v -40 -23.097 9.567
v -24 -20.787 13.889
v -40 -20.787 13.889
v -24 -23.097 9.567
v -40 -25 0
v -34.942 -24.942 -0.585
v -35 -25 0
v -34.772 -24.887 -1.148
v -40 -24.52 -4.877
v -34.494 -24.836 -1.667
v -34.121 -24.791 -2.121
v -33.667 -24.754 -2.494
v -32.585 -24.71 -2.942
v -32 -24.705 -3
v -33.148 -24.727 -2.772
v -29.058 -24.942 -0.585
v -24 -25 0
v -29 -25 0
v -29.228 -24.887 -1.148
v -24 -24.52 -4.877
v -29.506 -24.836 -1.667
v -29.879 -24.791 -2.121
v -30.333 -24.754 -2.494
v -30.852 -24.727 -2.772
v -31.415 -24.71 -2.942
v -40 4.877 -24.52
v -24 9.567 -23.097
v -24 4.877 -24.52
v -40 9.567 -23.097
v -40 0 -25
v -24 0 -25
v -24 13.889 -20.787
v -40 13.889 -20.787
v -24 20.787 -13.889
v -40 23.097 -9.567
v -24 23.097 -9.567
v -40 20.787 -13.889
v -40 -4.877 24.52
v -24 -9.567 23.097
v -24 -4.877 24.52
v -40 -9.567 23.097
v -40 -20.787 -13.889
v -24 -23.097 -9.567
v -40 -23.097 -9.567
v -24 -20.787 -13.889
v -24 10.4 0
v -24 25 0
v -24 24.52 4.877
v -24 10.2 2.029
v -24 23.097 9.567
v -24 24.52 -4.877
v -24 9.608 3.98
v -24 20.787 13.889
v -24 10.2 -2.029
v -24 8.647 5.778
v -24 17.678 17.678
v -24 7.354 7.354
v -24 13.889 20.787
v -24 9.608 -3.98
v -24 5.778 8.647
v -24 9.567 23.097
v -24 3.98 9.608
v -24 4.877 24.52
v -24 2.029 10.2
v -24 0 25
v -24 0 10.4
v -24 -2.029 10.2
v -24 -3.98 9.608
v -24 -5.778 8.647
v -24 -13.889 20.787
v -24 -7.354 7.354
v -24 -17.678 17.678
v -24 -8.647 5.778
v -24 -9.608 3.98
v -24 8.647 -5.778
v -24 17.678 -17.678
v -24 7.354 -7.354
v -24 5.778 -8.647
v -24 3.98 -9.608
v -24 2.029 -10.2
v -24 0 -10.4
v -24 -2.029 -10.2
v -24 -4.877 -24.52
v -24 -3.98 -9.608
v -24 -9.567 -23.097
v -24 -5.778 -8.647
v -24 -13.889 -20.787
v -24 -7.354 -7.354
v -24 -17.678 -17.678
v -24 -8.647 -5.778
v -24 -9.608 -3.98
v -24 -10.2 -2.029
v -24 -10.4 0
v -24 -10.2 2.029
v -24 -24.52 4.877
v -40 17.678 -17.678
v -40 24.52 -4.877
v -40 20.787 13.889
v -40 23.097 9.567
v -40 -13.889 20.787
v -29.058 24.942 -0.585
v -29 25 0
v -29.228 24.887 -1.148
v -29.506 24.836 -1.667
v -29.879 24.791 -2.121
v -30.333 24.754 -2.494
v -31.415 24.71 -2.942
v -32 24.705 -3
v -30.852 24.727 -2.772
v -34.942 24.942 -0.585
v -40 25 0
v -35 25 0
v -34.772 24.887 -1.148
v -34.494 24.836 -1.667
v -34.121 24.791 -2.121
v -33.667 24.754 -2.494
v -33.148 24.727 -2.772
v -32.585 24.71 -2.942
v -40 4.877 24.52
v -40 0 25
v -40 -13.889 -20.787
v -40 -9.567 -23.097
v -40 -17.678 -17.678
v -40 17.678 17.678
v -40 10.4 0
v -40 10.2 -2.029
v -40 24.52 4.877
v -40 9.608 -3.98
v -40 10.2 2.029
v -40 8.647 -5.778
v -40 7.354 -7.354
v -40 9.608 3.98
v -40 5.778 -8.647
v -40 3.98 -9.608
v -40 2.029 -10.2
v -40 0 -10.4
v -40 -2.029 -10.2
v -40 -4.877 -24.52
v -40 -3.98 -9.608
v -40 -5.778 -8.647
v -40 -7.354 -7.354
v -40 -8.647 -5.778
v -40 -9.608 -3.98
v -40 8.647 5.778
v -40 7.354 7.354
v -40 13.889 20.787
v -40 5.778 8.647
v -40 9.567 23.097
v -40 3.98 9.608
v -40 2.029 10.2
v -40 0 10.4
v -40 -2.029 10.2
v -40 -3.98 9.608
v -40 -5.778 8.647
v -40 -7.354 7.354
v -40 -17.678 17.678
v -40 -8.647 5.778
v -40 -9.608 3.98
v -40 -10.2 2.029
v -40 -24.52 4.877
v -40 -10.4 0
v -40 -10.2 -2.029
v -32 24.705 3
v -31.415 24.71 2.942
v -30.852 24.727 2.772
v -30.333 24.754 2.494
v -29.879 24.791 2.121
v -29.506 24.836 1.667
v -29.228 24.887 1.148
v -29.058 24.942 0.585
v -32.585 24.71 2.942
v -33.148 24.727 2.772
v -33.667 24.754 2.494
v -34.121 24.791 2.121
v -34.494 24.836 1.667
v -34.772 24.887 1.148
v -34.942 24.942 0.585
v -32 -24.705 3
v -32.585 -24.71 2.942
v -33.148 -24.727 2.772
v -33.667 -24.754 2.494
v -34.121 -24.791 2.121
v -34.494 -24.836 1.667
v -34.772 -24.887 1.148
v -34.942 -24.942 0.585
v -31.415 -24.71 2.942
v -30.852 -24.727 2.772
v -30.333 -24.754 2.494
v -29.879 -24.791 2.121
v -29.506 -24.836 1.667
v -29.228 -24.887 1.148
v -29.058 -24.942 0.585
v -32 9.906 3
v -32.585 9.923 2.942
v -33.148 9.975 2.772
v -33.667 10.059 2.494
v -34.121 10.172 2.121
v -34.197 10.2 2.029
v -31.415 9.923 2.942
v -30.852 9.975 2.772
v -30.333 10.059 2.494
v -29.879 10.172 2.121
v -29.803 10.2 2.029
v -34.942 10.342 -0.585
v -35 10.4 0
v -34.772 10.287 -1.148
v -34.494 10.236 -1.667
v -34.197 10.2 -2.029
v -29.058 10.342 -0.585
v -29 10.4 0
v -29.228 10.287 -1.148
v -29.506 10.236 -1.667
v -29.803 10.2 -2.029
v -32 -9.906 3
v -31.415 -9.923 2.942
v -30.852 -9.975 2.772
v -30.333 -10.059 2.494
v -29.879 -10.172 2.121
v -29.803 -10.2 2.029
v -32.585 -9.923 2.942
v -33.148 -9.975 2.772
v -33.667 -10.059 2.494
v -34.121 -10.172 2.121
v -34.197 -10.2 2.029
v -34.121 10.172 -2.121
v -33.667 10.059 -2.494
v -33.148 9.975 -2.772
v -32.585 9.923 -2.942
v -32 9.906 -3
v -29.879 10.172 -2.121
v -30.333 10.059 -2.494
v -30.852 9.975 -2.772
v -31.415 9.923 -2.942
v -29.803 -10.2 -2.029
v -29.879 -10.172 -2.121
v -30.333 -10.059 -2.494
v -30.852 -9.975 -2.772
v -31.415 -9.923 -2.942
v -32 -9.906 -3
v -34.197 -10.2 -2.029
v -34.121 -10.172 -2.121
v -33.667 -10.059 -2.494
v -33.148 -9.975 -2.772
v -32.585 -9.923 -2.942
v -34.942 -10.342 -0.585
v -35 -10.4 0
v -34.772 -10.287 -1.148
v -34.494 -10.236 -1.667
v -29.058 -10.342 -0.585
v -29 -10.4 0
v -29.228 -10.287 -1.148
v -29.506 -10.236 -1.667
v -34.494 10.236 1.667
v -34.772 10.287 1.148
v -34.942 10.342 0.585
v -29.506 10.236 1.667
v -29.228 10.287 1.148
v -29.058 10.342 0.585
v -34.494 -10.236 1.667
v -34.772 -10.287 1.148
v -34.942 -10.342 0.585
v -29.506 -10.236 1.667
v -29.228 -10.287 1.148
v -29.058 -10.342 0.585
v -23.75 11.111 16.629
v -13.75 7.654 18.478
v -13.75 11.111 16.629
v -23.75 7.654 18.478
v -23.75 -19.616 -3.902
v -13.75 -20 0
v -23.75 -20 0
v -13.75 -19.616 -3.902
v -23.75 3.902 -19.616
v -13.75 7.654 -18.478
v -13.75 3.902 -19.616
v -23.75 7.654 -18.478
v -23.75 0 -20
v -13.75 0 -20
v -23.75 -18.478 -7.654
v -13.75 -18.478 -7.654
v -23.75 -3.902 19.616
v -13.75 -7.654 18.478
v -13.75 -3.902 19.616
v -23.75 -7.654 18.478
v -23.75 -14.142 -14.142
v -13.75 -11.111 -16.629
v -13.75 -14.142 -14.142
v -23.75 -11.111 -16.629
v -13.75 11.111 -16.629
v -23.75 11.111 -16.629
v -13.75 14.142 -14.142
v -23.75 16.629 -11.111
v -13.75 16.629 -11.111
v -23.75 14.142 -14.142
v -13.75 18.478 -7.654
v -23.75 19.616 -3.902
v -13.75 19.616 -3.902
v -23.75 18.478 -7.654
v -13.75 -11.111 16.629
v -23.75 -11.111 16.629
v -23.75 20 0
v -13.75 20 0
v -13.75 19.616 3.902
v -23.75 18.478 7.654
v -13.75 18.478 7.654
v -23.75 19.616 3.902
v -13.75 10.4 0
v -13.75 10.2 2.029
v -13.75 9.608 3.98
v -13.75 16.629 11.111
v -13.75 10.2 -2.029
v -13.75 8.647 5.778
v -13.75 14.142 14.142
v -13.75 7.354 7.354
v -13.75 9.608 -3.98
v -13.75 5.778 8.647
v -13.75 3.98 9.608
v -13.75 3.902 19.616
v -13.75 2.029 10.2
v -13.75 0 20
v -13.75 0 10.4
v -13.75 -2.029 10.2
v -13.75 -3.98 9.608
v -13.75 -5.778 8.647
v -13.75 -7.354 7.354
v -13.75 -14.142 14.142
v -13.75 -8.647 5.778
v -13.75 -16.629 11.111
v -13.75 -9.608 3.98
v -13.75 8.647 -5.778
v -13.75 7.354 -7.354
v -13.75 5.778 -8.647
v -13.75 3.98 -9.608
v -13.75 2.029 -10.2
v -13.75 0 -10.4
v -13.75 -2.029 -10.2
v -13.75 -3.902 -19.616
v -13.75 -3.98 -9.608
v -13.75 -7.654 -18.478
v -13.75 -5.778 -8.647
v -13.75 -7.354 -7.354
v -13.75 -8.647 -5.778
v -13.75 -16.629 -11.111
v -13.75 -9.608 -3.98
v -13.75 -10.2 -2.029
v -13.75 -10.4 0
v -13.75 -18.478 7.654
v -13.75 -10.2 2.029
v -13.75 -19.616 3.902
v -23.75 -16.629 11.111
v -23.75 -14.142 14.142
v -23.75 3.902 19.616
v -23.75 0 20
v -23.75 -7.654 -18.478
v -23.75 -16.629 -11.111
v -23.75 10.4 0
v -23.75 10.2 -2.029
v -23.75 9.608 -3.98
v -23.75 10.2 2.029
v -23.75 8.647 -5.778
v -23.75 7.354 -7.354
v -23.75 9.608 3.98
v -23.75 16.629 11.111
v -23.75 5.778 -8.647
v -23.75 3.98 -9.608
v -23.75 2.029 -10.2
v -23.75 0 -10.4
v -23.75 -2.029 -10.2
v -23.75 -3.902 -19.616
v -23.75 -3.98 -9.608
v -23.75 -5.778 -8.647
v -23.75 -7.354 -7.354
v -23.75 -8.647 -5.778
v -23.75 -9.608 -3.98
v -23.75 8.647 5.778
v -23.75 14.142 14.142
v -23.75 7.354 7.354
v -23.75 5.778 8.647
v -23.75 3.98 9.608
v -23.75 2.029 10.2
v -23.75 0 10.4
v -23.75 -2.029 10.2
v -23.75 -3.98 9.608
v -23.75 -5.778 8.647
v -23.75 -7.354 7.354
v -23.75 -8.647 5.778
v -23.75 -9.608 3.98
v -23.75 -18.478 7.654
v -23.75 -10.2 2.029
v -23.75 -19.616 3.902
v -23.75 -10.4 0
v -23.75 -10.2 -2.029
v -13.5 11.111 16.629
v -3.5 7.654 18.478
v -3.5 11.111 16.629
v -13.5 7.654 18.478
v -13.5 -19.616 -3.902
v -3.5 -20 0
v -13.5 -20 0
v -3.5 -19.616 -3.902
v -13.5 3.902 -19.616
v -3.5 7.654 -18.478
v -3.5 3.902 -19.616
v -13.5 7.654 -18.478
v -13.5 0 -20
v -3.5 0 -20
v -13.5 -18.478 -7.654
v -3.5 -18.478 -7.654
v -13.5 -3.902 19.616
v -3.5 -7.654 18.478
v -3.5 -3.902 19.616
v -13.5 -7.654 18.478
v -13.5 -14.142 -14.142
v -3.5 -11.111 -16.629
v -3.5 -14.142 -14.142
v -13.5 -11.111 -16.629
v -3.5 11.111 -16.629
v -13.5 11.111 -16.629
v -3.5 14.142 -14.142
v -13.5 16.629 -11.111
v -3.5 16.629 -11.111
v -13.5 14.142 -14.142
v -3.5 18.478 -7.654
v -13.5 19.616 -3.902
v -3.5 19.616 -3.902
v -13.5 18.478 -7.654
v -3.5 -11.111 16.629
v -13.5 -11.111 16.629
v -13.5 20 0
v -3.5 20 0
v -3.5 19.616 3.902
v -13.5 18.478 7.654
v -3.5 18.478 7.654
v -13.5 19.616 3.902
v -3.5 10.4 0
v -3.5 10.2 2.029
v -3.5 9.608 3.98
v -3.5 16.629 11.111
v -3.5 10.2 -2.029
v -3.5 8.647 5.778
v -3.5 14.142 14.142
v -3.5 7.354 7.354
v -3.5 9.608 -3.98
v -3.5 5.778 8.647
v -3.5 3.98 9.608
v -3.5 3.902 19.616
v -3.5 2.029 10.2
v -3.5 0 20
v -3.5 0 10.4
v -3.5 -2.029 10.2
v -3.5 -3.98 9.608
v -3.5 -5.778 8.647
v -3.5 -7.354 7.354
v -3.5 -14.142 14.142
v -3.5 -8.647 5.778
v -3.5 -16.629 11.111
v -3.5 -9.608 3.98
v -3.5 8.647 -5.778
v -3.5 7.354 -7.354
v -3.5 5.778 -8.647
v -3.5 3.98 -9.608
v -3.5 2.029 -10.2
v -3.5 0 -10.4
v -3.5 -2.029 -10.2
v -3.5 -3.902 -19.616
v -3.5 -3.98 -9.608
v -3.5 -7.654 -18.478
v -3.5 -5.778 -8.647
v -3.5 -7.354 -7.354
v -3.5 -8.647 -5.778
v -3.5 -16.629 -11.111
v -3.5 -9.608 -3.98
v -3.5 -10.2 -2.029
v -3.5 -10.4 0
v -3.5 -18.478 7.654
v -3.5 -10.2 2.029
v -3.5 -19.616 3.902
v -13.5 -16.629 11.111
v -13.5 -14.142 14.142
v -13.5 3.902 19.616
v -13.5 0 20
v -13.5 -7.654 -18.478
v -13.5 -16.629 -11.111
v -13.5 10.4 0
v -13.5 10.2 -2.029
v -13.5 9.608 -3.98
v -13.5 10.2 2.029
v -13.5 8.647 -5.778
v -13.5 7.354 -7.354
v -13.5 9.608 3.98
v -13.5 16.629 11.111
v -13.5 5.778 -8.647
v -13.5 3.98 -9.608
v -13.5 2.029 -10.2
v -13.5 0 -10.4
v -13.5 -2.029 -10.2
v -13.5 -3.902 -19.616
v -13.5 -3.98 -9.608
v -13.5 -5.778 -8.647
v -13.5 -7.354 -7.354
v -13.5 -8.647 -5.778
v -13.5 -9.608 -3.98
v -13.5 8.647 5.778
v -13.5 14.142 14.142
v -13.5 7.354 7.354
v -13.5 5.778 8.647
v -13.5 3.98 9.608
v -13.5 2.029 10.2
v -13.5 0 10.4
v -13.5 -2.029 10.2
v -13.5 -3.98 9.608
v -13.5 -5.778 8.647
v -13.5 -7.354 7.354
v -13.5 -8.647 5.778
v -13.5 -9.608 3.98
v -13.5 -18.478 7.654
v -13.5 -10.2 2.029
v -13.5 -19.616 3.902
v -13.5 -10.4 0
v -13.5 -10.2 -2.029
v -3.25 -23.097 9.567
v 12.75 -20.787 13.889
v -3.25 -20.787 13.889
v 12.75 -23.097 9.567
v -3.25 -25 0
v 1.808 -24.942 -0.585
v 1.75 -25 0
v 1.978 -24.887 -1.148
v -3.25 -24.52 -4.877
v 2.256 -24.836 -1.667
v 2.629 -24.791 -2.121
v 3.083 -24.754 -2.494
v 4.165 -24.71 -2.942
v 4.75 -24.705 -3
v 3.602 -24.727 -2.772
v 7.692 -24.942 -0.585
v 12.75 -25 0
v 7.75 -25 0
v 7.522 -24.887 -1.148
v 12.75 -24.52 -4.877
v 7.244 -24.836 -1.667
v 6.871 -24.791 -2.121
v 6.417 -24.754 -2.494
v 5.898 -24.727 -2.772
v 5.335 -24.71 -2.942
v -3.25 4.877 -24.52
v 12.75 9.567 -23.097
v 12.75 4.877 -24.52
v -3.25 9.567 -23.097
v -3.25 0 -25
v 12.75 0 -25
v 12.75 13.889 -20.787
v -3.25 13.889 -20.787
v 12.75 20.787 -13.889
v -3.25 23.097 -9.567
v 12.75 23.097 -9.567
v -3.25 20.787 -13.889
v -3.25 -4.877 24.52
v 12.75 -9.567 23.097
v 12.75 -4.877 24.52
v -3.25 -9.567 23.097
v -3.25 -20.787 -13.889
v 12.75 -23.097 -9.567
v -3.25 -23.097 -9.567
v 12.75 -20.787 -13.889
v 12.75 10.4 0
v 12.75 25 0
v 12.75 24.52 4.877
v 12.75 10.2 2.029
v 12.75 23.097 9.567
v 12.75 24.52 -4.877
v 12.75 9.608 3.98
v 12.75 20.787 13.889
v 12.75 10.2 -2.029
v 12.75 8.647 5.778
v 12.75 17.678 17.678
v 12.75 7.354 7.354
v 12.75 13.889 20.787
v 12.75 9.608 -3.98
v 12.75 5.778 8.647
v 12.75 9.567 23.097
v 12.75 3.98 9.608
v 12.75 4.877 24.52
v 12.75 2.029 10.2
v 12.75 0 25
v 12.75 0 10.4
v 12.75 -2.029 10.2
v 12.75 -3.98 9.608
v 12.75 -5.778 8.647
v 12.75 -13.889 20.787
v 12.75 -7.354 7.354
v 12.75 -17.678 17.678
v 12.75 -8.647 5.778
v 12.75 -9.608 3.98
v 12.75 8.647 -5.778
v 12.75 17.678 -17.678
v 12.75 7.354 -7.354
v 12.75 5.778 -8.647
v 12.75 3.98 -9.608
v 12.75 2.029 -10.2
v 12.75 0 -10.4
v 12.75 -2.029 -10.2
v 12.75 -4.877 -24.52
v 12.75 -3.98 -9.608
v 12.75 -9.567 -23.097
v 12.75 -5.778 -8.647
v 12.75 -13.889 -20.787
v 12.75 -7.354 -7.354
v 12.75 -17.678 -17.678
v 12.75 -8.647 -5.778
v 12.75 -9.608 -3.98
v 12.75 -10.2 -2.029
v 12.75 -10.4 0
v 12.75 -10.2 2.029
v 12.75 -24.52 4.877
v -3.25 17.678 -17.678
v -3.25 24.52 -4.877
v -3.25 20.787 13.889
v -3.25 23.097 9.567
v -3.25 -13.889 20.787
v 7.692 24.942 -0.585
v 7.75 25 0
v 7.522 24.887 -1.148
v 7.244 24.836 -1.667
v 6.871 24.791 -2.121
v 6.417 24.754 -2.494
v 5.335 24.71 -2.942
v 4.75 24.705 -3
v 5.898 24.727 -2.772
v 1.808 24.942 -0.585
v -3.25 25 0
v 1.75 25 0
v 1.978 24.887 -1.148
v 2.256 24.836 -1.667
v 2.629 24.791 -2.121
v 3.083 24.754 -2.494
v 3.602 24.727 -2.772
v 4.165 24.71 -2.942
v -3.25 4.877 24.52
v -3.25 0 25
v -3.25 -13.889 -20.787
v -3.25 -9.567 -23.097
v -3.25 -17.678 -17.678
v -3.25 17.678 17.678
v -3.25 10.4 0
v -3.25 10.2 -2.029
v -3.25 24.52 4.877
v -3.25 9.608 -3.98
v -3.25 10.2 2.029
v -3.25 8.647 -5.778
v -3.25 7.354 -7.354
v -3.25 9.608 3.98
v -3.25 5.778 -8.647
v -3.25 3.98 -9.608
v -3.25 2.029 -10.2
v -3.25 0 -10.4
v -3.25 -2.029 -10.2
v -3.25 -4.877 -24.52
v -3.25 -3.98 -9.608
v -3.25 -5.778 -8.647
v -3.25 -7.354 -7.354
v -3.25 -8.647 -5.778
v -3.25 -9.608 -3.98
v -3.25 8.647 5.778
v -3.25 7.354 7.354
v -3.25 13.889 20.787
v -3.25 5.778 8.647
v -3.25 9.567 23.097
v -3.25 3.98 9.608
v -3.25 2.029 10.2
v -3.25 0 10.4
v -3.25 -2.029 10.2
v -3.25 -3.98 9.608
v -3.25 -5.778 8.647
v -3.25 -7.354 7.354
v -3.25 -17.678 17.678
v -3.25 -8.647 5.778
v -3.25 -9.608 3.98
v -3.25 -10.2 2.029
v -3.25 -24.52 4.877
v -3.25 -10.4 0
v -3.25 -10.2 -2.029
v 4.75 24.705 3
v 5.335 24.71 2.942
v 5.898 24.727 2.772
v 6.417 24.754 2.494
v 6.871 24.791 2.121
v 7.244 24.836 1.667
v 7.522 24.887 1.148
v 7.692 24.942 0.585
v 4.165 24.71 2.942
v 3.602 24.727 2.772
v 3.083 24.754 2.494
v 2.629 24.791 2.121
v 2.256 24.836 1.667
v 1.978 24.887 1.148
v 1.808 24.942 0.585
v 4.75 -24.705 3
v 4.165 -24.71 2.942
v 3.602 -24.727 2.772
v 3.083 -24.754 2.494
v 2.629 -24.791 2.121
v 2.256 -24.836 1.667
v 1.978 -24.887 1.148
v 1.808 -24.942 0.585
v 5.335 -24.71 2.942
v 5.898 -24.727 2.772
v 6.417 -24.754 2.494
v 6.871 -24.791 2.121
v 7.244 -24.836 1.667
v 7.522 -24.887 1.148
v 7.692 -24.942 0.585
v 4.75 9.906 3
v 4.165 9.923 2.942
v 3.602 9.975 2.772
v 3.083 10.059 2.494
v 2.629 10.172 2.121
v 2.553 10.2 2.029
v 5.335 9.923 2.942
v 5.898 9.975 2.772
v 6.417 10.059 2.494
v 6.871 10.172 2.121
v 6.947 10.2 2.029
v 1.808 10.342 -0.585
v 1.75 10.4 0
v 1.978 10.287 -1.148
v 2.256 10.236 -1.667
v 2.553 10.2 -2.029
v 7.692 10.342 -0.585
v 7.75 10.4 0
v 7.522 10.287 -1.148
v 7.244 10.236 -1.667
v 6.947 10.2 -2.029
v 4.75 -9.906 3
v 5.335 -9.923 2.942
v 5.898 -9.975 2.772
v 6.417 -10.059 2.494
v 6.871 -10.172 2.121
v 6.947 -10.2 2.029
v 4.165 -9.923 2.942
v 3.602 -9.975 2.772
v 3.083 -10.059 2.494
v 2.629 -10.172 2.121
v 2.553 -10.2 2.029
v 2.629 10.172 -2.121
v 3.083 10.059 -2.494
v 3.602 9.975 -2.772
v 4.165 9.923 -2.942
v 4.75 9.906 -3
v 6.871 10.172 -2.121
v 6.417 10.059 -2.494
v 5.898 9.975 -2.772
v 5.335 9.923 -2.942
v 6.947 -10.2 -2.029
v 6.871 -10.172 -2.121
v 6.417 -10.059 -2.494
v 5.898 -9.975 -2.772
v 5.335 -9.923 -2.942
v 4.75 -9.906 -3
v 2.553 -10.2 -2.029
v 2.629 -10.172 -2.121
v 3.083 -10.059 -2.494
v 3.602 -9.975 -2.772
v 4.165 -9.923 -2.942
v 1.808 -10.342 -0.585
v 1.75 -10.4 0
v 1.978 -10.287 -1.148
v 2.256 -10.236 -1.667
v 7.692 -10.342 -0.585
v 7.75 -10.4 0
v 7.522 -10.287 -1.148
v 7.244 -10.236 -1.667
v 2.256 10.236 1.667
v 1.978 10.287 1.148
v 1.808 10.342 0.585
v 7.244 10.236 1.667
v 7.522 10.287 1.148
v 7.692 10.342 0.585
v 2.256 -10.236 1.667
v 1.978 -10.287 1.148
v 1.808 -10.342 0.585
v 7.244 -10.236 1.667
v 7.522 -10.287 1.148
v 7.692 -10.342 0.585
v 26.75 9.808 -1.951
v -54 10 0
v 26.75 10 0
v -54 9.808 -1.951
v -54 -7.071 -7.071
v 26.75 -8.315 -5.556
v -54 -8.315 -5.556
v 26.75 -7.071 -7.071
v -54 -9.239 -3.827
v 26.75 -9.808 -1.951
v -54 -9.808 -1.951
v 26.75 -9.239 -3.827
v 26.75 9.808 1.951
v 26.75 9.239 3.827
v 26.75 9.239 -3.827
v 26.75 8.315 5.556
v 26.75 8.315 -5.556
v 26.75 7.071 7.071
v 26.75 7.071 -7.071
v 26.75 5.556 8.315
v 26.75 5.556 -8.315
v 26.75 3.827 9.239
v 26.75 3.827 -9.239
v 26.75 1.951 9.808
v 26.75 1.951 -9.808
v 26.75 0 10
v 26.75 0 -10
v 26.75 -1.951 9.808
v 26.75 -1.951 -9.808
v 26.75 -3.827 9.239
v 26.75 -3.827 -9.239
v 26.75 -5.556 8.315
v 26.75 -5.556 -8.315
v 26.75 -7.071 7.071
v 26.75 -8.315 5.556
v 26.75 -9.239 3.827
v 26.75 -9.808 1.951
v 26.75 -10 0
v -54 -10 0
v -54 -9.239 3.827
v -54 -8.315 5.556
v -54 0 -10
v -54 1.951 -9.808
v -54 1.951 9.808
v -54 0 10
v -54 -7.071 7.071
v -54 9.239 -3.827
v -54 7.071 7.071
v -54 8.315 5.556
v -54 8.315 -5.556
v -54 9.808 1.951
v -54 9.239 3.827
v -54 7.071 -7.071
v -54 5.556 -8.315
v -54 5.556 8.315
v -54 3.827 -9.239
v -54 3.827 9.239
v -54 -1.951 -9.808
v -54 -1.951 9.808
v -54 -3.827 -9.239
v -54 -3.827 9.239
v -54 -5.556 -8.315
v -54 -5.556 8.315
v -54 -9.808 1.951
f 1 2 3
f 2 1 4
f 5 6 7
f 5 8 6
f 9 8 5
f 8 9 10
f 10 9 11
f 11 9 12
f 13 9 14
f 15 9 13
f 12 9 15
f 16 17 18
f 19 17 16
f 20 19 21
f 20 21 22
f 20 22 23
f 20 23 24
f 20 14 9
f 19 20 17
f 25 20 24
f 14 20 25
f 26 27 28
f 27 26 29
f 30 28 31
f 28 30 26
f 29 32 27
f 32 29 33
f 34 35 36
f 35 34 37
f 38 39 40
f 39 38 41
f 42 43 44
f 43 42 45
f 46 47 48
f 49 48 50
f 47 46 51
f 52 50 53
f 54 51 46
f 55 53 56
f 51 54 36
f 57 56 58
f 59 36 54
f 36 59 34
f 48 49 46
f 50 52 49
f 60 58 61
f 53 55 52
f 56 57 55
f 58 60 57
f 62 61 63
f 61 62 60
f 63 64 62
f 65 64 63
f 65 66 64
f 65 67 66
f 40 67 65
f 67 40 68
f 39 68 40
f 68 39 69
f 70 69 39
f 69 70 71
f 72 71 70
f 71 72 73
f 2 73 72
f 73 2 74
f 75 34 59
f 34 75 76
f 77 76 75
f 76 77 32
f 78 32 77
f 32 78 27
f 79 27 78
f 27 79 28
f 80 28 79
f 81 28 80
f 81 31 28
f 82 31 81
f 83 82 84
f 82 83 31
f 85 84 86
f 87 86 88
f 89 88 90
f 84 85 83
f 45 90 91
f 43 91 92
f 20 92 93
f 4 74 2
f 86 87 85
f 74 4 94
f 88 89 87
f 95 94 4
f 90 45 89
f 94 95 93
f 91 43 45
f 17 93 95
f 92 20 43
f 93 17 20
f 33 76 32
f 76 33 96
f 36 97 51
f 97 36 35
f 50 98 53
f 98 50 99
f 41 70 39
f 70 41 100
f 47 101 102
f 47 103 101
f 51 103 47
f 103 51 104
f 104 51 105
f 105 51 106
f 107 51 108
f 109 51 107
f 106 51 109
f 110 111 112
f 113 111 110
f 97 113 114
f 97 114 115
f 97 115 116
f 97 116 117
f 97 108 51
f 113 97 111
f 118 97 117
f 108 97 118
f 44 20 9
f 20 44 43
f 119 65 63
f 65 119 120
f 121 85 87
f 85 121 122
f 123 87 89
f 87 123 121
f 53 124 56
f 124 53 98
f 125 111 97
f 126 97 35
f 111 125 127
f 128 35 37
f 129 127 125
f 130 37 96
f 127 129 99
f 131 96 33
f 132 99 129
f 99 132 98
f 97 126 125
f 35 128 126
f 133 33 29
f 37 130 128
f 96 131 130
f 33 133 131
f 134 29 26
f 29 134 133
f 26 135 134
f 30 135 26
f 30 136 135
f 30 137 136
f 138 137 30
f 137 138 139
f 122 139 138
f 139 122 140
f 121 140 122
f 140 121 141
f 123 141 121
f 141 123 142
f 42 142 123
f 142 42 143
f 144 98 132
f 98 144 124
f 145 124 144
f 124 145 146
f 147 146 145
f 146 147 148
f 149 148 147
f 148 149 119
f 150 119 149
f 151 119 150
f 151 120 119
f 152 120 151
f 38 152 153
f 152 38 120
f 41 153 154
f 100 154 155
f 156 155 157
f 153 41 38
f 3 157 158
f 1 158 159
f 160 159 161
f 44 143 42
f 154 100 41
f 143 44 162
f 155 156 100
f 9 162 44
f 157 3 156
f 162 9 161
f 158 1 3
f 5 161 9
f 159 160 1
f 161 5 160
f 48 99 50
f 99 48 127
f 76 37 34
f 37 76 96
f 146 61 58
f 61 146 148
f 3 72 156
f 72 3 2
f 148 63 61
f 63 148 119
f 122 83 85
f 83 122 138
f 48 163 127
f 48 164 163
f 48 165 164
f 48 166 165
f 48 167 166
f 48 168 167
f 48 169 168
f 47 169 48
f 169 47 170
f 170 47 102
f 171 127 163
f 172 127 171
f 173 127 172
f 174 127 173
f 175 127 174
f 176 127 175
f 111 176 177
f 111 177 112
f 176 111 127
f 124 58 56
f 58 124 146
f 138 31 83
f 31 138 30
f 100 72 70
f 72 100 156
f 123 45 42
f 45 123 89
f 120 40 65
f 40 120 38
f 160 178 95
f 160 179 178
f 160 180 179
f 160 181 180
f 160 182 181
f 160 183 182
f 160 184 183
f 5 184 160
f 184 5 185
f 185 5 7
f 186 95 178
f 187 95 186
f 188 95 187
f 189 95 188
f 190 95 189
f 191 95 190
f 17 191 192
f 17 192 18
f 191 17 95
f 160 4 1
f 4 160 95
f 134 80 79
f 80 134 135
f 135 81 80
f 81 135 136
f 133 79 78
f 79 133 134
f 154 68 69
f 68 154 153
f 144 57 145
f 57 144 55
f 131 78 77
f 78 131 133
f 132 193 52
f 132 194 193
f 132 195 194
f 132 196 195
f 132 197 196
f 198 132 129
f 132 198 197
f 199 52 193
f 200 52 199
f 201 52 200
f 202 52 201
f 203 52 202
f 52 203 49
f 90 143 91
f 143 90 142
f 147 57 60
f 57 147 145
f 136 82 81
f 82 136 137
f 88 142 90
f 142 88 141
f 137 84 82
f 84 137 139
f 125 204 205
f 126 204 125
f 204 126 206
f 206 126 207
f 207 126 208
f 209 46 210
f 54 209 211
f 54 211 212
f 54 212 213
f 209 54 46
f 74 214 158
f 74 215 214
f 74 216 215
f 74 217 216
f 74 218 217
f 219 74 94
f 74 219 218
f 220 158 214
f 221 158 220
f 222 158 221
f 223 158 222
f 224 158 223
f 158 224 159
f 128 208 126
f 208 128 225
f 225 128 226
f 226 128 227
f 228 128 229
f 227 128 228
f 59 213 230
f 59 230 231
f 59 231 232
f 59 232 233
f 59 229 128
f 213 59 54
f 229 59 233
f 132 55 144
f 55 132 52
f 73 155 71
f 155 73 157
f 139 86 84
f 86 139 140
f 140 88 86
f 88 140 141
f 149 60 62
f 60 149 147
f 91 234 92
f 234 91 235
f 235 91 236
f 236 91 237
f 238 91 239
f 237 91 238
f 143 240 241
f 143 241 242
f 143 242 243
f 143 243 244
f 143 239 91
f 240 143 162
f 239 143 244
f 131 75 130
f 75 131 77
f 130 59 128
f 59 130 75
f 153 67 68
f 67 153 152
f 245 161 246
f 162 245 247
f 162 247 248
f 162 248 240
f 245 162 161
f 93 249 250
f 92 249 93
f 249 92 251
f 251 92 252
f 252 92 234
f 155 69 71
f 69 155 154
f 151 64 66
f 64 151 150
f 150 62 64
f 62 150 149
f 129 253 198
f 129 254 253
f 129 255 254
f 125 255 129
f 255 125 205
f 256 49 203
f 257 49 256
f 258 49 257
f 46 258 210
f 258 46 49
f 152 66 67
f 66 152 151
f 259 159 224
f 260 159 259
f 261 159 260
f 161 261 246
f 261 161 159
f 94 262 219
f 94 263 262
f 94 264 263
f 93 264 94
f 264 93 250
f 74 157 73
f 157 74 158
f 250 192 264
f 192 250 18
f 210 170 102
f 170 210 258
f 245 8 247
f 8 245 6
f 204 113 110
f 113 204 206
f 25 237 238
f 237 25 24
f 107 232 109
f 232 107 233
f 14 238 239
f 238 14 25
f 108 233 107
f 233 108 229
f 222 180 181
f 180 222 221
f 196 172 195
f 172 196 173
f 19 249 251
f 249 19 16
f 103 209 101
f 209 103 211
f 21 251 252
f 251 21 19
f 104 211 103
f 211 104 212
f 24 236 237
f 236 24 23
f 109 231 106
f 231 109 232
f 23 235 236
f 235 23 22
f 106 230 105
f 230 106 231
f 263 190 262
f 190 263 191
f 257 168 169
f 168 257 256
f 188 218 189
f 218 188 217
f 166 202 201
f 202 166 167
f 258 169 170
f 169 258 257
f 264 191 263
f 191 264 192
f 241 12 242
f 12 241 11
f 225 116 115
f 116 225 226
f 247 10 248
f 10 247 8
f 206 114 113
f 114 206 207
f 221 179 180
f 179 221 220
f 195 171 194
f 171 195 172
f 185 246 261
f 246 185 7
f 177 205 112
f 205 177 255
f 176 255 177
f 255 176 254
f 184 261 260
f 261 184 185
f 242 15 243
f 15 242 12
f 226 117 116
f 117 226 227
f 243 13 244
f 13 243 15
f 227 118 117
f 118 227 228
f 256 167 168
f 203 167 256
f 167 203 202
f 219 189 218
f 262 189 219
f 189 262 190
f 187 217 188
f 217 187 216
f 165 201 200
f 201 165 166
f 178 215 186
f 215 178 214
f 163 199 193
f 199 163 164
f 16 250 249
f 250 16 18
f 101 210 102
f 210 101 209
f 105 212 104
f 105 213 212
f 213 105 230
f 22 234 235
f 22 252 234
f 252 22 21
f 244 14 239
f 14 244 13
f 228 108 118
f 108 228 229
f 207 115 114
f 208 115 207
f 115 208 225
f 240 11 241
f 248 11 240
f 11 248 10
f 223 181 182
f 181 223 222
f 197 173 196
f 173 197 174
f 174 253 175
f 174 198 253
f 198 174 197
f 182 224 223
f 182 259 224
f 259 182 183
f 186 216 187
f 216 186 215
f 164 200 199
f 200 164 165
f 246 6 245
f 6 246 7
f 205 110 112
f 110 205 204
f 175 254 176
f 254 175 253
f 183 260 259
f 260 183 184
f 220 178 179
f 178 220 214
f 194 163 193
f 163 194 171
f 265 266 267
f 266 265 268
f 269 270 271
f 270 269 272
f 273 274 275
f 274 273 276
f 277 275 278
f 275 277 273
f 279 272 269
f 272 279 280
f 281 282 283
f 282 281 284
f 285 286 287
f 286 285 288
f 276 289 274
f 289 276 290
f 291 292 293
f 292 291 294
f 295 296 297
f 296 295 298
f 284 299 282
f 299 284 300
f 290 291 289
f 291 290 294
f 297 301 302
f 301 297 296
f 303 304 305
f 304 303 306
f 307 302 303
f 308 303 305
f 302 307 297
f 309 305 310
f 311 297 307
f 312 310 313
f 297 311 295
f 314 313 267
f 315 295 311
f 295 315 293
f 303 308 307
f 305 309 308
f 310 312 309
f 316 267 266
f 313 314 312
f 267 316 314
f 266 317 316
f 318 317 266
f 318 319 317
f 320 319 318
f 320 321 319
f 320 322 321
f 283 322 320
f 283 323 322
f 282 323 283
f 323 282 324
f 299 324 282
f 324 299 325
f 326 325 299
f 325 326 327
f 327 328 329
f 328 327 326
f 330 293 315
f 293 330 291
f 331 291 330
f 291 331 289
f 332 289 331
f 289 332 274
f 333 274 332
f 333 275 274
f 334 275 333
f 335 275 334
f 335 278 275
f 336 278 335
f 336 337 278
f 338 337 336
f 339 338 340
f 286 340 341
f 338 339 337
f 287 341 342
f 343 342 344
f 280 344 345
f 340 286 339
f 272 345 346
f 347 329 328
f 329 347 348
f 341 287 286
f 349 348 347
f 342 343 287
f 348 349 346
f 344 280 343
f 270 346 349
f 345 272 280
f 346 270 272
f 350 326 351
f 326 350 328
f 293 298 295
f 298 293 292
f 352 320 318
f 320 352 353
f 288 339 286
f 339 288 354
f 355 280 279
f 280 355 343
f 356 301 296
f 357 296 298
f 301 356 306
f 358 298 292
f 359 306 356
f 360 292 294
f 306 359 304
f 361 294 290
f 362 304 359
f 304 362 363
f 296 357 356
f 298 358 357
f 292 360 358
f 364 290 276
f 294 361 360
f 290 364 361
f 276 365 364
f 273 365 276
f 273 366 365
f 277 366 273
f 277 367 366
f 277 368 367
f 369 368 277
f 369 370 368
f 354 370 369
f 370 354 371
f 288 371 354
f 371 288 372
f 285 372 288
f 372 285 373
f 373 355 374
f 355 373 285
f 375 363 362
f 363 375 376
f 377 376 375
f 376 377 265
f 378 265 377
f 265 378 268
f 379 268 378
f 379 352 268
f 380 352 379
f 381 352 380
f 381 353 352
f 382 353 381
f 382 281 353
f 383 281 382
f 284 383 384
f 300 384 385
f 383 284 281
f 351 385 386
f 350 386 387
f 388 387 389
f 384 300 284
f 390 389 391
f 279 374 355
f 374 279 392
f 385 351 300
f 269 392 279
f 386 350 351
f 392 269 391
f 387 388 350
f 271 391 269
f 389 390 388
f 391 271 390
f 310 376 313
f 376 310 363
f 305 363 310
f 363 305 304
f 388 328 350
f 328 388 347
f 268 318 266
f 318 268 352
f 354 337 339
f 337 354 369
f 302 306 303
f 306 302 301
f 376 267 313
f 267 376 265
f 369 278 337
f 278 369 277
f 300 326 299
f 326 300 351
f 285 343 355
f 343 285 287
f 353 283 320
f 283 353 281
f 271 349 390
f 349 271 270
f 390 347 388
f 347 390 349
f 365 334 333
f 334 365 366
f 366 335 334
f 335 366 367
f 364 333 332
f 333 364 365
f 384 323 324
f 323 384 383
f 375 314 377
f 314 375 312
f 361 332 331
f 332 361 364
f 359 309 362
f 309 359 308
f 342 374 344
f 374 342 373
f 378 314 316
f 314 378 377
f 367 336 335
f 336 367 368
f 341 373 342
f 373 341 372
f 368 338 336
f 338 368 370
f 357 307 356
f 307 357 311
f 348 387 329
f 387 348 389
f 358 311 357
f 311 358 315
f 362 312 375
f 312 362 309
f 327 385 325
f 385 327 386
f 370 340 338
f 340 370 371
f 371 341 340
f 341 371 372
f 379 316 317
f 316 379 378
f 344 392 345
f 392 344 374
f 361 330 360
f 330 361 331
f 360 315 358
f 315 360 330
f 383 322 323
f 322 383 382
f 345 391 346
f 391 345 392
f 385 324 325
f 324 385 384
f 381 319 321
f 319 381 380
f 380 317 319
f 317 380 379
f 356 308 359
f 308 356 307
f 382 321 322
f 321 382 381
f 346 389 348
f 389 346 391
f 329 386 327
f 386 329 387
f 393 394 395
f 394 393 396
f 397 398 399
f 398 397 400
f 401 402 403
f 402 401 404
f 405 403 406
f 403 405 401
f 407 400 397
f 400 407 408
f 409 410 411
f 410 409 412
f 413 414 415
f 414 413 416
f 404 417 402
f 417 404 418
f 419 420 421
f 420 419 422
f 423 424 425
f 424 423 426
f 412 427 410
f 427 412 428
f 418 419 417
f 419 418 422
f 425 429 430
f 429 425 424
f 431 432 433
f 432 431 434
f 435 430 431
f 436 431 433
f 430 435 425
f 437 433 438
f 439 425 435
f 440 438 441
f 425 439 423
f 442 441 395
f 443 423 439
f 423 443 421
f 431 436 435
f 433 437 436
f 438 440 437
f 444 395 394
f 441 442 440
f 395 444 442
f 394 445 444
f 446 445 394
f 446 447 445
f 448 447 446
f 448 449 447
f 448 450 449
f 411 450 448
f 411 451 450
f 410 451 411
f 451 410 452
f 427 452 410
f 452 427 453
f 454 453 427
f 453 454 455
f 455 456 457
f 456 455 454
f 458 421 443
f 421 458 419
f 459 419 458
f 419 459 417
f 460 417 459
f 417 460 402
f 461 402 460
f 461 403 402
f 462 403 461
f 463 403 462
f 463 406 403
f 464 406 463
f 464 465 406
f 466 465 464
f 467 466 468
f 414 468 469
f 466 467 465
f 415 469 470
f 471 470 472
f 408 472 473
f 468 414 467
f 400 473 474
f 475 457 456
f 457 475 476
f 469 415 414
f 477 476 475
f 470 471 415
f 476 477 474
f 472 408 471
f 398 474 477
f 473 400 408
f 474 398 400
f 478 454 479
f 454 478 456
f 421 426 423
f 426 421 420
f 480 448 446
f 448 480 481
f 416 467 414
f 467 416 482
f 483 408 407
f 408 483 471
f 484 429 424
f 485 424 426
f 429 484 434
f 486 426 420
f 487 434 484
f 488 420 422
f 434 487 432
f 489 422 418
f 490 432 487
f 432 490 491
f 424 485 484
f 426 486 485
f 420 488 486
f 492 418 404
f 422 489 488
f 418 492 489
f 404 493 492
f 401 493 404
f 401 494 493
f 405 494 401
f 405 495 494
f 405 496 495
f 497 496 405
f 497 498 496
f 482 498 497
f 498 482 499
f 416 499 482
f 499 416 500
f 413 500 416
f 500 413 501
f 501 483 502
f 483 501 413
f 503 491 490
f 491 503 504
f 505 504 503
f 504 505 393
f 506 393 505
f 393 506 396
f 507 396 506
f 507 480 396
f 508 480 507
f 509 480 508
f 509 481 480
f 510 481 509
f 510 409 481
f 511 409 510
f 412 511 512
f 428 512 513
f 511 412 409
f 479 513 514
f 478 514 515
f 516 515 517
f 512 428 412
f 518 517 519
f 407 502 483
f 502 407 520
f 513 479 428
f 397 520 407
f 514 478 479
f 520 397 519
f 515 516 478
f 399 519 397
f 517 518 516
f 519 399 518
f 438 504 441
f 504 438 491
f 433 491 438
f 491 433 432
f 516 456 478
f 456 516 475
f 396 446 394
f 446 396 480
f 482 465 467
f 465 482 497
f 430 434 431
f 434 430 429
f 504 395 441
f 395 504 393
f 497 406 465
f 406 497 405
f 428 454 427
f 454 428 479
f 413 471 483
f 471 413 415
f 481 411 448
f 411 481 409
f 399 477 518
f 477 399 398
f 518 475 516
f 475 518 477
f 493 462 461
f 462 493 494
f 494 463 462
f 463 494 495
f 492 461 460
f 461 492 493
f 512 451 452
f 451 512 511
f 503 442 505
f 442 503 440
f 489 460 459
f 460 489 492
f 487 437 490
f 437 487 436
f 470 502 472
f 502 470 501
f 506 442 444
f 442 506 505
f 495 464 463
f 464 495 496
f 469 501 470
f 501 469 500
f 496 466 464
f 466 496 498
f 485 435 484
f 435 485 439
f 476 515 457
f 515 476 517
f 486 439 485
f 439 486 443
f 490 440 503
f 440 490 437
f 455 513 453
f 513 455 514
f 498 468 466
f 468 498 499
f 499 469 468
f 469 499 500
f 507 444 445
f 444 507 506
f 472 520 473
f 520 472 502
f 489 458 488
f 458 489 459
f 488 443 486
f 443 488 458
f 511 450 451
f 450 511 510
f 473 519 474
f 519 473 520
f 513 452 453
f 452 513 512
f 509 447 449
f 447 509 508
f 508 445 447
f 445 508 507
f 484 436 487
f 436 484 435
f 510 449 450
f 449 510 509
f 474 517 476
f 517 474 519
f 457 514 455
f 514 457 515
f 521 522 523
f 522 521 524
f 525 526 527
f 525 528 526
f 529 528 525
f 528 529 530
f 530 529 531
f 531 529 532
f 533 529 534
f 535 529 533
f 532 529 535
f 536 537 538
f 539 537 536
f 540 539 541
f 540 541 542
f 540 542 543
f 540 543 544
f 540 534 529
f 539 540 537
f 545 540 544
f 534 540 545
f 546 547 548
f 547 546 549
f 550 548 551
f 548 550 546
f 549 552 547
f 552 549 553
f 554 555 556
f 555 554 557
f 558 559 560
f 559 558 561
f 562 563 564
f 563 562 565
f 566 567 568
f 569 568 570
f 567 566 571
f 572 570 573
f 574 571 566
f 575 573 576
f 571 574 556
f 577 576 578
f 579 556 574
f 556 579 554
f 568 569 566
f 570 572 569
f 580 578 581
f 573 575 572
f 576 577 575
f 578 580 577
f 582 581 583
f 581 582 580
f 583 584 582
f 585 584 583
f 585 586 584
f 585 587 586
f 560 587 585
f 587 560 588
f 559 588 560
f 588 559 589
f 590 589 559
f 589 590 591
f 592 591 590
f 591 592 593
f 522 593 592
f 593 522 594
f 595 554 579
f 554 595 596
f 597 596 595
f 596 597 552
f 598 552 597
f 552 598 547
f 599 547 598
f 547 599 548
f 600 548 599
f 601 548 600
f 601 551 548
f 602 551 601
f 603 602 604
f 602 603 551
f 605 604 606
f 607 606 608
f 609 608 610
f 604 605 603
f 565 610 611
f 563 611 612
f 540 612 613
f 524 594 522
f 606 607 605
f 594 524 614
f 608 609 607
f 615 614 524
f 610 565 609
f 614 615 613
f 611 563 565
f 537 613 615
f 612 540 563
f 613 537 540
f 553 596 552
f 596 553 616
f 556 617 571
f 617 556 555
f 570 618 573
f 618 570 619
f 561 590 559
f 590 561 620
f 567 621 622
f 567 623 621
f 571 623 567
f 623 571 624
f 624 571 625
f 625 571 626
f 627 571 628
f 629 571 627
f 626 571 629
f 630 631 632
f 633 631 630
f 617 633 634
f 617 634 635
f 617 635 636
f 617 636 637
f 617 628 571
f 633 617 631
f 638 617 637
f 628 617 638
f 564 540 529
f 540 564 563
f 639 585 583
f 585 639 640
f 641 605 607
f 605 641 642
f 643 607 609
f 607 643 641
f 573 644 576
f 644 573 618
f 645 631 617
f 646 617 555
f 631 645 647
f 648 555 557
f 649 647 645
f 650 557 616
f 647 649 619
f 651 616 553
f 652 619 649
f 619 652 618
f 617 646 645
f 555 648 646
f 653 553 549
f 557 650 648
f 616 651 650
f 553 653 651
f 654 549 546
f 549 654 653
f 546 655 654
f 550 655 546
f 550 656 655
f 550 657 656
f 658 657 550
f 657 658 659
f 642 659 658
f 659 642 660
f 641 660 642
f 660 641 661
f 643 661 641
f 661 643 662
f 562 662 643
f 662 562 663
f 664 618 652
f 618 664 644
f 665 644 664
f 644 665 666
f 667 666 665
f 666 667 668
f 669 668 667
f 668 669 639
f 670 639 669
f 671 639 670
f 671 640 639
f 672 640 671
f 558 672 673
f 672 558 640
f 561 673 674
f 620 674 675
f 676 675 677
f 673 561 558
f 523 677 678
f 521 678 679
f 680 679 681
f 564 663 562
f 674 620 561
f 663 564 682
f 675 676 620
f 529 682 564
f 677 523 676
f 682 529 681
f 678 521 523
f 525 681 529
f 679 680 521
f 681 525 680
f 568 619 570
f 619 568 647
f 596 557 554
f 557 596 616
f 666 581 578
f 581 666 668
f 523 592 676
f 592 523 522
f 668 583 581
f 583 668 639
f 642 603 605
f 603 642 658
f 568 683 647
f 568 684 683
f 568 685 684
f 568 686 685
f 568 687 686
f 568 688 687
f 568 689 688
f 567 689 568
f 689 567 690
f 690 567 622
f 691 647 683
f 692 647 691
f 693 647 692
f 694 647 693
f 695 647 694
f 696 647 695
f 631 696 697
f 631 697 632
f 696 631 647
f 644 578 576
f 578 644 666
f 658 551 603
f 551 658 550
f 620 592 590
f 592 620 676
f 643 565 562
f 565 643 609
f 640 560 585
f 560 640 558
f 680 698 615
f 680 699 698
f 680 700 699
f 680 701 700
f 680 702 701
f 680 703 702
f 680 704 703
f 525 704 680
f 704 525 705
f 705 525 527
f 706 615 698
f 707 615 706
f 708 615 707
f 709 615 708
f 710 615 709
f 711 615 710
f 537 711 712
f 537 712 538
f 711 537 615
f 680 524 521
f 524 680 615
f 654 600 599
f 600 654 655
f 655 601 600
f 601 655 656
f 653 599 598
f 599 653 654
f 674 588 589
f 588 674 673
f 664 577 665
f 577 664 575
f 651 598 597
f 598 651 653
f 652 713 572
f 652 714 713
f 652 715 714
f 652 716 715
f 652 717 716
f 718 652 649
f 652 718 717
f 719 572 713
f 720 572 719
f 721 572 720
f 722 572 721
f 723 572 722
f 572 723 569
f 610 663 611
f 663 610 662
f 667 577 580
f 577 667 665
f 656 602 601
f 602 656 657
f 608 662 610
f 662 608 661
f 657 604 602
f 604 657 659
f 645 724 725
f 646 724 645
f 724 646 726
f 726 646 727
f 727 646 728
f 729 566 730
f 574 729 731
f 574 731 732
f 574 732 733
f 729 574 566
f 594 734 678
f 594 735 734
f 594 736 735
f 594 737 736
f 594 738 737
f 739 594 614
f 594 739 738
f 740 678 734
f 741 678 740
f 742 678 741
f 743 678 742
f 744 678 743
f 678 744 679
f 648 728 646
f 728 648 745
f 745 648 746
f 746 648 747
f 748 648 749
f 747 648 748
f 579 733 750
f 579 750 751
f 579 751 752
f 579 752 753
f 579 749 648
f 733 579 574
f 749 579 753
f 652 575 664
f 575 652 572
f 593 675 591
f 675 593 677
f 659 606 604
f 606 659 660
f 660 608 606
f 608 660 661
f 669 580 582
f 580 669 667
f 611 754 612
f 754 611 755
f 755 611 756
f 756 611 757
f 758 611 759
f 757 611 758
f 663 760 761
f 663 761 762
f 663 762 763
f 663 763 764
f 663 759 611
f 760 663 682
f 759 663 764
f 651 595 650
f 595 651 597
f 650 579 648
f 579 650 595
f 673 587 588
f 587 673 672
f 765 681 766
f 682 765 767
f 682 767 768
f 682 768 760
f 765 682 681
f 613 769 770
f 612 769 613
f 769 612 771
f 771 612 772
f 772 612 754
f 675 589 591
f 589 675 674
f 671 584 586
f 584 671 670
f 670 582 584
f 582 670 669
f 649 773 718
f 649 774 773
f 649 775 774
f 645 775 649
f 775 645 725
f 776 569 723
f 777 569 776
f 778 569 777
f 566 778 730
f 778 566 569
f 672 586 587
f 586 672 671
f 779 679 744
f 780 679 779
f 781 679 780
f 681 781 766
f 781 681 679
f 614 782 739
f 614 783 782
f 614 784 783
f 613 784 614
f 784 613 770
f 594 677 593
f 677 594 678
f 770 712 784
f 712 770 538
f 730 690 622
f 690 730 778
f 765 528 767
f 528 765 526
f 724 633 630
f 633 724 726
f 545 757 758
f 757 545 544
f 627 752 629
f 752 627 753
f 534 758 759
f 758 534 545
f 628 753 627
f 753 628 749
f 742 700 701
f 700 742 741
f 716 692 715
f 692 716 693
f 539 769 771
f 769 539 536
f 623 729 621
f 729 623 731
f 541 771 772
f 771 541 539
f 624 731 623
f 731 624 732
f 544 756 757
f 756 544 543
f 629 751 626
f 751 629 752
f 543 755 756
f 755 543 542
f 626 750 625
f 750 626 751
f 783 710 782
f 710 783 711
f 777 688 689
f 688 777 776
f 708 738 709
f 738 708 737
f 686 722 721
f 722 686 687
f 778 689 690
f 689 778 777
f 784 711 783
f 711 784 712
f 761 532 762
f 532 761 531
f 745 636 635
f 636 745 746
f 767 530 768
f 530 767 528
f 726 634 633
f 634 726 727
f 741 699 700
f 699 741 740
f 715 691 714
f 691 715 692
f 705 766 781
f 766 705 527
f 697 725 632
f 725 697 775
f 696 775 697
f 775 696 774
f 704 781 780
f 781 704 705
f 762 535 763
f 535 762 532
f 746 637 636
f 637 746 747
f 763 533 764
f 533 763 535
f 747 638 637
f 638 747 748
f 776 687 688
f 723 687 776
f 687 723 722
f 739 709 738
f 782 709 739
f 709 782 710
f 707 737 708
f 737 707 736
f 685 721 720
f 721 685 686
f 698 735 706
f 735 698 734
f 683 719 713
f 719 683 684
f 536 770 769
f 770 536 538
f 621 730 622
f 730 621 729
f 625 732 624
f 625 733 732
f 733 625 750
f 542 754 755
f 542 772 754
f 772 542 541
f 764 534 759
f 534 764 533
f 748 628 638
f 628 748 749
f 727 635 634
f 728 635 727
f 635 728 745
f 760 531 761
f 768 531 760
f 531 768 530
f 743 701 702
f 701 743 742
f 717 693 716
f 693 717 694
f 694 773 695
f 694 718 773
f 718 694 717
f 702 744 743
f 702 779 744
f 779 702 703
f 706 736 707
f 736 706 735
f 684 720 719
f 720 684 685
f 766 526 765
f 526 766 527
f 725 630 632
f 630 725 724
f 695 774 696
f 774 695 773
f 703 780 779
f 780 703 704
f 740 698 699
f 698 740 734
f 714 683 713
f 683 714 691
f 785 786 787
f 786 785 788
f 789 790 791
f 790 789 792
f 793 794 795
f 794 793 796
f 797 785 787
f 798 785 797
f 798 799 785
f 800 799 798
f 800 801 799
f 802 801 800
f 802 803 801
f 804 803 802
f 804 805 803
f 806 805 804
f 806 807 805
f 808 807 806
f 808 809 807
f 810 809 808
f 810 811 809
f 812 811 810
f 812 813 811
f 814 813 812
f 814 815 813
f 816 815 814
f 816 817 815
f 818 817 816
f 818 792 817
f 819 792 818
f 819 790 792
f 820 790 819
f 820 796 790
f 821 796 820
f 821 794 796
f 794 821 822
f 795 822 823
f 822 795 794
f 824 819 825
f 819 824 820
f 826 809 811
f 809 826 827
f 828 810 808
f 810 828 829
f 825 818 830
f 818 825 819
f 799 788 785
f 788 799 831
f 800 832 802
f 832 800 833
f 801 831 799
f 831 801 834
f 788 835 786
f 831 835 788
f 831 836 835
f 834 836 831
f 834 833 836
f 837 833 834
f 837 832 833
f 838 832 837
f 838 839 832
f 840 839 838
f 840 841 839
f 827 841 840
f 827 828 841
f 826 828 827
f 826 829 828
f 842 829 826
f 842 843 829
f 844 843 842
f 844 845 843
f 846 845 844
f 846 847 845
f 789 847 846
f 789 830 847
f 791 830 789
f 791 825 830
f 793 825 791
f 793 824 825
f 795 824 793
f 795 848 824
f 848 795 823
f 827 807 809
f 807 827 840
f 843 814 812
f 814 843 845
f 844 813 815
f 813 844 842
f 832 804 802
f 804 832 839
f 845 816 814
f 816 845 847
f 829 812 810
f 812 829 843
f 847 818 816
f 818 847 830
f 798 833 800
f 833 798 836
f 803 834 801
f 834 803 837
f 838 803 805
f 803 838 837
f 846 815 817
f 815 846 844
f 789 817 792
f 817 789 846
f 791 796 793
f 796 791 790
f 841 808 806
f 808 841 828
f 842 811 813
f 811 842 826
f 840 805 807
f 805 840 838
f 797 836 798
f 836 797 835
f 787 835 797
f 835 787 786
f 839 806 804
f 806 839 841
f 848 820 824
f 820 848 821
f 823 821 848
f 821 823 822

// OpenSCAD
$fn = 32;

// ------------------------------------------------------------------------
// Shaft with rings and collars: d20 shaft, 4 rings
// Every part is its own module, assembly() places them once.
// ------------------------------------------------------------------------

// --- part 1 ---
module shaft() {
  translate([0, 0, -40.375]) cylinder(h = 80.75, d = 20);
}

// --- part 2 ---
module collar_a() {
  difference() {
    cylinder(h = 16, d = 50);
    translate([0, 0, -1]) cylinder(h = 18, d = 20.8);
    translate([0, 0, 8]) rotate([90, 0, 0]) cylinder(h = 52, d = 6, center = true);
  }
}

// --- part 3 ---
module spacer_a() {
  difference() {
      translate([0, 0, 0]) cylinder(h = 10, d = 40);
      translate([0, 0, -1]) cylinder(h = 12, d = 20.8);
    }
}

// --- part 4 ---
module spacer_b() {
  difference() {
      translate([0, 0, 0]) cylinder(h = 10, d = 40);
      translate([0, 0, -1]) cylinder(h = 12, d = 20.8);
    }
}

// --- part 5 ---
module collar_b() {
  difference() {
    cylinder(h = 16, d = 50);
    translate([0, 0, -1]) cylinder(h = 18, d = 20.8);
    translate([0, 0, 8]) rotate([90, 0, 0]) cylinder(h = 52, d = 6, center = true);
  }
}

// --- assembly ---
module assembly() {
  translate([-13.625, 0, 0]) rotate([0, 90, 0]) shaft();
  translate([-40, 0, 0]) rotate([0, 90, 0]) collar_a();
  translate([-23.75, 0, 0]) rotate([0, 90, 0]) spacer_a();
  translate([-13.5, 0, 0]) rotate([0, 90, 0]) spacer_b();
  translate([-3.25, 0, 0]) rotate([0, 90, 0]) collar_b();
}

assembly();
